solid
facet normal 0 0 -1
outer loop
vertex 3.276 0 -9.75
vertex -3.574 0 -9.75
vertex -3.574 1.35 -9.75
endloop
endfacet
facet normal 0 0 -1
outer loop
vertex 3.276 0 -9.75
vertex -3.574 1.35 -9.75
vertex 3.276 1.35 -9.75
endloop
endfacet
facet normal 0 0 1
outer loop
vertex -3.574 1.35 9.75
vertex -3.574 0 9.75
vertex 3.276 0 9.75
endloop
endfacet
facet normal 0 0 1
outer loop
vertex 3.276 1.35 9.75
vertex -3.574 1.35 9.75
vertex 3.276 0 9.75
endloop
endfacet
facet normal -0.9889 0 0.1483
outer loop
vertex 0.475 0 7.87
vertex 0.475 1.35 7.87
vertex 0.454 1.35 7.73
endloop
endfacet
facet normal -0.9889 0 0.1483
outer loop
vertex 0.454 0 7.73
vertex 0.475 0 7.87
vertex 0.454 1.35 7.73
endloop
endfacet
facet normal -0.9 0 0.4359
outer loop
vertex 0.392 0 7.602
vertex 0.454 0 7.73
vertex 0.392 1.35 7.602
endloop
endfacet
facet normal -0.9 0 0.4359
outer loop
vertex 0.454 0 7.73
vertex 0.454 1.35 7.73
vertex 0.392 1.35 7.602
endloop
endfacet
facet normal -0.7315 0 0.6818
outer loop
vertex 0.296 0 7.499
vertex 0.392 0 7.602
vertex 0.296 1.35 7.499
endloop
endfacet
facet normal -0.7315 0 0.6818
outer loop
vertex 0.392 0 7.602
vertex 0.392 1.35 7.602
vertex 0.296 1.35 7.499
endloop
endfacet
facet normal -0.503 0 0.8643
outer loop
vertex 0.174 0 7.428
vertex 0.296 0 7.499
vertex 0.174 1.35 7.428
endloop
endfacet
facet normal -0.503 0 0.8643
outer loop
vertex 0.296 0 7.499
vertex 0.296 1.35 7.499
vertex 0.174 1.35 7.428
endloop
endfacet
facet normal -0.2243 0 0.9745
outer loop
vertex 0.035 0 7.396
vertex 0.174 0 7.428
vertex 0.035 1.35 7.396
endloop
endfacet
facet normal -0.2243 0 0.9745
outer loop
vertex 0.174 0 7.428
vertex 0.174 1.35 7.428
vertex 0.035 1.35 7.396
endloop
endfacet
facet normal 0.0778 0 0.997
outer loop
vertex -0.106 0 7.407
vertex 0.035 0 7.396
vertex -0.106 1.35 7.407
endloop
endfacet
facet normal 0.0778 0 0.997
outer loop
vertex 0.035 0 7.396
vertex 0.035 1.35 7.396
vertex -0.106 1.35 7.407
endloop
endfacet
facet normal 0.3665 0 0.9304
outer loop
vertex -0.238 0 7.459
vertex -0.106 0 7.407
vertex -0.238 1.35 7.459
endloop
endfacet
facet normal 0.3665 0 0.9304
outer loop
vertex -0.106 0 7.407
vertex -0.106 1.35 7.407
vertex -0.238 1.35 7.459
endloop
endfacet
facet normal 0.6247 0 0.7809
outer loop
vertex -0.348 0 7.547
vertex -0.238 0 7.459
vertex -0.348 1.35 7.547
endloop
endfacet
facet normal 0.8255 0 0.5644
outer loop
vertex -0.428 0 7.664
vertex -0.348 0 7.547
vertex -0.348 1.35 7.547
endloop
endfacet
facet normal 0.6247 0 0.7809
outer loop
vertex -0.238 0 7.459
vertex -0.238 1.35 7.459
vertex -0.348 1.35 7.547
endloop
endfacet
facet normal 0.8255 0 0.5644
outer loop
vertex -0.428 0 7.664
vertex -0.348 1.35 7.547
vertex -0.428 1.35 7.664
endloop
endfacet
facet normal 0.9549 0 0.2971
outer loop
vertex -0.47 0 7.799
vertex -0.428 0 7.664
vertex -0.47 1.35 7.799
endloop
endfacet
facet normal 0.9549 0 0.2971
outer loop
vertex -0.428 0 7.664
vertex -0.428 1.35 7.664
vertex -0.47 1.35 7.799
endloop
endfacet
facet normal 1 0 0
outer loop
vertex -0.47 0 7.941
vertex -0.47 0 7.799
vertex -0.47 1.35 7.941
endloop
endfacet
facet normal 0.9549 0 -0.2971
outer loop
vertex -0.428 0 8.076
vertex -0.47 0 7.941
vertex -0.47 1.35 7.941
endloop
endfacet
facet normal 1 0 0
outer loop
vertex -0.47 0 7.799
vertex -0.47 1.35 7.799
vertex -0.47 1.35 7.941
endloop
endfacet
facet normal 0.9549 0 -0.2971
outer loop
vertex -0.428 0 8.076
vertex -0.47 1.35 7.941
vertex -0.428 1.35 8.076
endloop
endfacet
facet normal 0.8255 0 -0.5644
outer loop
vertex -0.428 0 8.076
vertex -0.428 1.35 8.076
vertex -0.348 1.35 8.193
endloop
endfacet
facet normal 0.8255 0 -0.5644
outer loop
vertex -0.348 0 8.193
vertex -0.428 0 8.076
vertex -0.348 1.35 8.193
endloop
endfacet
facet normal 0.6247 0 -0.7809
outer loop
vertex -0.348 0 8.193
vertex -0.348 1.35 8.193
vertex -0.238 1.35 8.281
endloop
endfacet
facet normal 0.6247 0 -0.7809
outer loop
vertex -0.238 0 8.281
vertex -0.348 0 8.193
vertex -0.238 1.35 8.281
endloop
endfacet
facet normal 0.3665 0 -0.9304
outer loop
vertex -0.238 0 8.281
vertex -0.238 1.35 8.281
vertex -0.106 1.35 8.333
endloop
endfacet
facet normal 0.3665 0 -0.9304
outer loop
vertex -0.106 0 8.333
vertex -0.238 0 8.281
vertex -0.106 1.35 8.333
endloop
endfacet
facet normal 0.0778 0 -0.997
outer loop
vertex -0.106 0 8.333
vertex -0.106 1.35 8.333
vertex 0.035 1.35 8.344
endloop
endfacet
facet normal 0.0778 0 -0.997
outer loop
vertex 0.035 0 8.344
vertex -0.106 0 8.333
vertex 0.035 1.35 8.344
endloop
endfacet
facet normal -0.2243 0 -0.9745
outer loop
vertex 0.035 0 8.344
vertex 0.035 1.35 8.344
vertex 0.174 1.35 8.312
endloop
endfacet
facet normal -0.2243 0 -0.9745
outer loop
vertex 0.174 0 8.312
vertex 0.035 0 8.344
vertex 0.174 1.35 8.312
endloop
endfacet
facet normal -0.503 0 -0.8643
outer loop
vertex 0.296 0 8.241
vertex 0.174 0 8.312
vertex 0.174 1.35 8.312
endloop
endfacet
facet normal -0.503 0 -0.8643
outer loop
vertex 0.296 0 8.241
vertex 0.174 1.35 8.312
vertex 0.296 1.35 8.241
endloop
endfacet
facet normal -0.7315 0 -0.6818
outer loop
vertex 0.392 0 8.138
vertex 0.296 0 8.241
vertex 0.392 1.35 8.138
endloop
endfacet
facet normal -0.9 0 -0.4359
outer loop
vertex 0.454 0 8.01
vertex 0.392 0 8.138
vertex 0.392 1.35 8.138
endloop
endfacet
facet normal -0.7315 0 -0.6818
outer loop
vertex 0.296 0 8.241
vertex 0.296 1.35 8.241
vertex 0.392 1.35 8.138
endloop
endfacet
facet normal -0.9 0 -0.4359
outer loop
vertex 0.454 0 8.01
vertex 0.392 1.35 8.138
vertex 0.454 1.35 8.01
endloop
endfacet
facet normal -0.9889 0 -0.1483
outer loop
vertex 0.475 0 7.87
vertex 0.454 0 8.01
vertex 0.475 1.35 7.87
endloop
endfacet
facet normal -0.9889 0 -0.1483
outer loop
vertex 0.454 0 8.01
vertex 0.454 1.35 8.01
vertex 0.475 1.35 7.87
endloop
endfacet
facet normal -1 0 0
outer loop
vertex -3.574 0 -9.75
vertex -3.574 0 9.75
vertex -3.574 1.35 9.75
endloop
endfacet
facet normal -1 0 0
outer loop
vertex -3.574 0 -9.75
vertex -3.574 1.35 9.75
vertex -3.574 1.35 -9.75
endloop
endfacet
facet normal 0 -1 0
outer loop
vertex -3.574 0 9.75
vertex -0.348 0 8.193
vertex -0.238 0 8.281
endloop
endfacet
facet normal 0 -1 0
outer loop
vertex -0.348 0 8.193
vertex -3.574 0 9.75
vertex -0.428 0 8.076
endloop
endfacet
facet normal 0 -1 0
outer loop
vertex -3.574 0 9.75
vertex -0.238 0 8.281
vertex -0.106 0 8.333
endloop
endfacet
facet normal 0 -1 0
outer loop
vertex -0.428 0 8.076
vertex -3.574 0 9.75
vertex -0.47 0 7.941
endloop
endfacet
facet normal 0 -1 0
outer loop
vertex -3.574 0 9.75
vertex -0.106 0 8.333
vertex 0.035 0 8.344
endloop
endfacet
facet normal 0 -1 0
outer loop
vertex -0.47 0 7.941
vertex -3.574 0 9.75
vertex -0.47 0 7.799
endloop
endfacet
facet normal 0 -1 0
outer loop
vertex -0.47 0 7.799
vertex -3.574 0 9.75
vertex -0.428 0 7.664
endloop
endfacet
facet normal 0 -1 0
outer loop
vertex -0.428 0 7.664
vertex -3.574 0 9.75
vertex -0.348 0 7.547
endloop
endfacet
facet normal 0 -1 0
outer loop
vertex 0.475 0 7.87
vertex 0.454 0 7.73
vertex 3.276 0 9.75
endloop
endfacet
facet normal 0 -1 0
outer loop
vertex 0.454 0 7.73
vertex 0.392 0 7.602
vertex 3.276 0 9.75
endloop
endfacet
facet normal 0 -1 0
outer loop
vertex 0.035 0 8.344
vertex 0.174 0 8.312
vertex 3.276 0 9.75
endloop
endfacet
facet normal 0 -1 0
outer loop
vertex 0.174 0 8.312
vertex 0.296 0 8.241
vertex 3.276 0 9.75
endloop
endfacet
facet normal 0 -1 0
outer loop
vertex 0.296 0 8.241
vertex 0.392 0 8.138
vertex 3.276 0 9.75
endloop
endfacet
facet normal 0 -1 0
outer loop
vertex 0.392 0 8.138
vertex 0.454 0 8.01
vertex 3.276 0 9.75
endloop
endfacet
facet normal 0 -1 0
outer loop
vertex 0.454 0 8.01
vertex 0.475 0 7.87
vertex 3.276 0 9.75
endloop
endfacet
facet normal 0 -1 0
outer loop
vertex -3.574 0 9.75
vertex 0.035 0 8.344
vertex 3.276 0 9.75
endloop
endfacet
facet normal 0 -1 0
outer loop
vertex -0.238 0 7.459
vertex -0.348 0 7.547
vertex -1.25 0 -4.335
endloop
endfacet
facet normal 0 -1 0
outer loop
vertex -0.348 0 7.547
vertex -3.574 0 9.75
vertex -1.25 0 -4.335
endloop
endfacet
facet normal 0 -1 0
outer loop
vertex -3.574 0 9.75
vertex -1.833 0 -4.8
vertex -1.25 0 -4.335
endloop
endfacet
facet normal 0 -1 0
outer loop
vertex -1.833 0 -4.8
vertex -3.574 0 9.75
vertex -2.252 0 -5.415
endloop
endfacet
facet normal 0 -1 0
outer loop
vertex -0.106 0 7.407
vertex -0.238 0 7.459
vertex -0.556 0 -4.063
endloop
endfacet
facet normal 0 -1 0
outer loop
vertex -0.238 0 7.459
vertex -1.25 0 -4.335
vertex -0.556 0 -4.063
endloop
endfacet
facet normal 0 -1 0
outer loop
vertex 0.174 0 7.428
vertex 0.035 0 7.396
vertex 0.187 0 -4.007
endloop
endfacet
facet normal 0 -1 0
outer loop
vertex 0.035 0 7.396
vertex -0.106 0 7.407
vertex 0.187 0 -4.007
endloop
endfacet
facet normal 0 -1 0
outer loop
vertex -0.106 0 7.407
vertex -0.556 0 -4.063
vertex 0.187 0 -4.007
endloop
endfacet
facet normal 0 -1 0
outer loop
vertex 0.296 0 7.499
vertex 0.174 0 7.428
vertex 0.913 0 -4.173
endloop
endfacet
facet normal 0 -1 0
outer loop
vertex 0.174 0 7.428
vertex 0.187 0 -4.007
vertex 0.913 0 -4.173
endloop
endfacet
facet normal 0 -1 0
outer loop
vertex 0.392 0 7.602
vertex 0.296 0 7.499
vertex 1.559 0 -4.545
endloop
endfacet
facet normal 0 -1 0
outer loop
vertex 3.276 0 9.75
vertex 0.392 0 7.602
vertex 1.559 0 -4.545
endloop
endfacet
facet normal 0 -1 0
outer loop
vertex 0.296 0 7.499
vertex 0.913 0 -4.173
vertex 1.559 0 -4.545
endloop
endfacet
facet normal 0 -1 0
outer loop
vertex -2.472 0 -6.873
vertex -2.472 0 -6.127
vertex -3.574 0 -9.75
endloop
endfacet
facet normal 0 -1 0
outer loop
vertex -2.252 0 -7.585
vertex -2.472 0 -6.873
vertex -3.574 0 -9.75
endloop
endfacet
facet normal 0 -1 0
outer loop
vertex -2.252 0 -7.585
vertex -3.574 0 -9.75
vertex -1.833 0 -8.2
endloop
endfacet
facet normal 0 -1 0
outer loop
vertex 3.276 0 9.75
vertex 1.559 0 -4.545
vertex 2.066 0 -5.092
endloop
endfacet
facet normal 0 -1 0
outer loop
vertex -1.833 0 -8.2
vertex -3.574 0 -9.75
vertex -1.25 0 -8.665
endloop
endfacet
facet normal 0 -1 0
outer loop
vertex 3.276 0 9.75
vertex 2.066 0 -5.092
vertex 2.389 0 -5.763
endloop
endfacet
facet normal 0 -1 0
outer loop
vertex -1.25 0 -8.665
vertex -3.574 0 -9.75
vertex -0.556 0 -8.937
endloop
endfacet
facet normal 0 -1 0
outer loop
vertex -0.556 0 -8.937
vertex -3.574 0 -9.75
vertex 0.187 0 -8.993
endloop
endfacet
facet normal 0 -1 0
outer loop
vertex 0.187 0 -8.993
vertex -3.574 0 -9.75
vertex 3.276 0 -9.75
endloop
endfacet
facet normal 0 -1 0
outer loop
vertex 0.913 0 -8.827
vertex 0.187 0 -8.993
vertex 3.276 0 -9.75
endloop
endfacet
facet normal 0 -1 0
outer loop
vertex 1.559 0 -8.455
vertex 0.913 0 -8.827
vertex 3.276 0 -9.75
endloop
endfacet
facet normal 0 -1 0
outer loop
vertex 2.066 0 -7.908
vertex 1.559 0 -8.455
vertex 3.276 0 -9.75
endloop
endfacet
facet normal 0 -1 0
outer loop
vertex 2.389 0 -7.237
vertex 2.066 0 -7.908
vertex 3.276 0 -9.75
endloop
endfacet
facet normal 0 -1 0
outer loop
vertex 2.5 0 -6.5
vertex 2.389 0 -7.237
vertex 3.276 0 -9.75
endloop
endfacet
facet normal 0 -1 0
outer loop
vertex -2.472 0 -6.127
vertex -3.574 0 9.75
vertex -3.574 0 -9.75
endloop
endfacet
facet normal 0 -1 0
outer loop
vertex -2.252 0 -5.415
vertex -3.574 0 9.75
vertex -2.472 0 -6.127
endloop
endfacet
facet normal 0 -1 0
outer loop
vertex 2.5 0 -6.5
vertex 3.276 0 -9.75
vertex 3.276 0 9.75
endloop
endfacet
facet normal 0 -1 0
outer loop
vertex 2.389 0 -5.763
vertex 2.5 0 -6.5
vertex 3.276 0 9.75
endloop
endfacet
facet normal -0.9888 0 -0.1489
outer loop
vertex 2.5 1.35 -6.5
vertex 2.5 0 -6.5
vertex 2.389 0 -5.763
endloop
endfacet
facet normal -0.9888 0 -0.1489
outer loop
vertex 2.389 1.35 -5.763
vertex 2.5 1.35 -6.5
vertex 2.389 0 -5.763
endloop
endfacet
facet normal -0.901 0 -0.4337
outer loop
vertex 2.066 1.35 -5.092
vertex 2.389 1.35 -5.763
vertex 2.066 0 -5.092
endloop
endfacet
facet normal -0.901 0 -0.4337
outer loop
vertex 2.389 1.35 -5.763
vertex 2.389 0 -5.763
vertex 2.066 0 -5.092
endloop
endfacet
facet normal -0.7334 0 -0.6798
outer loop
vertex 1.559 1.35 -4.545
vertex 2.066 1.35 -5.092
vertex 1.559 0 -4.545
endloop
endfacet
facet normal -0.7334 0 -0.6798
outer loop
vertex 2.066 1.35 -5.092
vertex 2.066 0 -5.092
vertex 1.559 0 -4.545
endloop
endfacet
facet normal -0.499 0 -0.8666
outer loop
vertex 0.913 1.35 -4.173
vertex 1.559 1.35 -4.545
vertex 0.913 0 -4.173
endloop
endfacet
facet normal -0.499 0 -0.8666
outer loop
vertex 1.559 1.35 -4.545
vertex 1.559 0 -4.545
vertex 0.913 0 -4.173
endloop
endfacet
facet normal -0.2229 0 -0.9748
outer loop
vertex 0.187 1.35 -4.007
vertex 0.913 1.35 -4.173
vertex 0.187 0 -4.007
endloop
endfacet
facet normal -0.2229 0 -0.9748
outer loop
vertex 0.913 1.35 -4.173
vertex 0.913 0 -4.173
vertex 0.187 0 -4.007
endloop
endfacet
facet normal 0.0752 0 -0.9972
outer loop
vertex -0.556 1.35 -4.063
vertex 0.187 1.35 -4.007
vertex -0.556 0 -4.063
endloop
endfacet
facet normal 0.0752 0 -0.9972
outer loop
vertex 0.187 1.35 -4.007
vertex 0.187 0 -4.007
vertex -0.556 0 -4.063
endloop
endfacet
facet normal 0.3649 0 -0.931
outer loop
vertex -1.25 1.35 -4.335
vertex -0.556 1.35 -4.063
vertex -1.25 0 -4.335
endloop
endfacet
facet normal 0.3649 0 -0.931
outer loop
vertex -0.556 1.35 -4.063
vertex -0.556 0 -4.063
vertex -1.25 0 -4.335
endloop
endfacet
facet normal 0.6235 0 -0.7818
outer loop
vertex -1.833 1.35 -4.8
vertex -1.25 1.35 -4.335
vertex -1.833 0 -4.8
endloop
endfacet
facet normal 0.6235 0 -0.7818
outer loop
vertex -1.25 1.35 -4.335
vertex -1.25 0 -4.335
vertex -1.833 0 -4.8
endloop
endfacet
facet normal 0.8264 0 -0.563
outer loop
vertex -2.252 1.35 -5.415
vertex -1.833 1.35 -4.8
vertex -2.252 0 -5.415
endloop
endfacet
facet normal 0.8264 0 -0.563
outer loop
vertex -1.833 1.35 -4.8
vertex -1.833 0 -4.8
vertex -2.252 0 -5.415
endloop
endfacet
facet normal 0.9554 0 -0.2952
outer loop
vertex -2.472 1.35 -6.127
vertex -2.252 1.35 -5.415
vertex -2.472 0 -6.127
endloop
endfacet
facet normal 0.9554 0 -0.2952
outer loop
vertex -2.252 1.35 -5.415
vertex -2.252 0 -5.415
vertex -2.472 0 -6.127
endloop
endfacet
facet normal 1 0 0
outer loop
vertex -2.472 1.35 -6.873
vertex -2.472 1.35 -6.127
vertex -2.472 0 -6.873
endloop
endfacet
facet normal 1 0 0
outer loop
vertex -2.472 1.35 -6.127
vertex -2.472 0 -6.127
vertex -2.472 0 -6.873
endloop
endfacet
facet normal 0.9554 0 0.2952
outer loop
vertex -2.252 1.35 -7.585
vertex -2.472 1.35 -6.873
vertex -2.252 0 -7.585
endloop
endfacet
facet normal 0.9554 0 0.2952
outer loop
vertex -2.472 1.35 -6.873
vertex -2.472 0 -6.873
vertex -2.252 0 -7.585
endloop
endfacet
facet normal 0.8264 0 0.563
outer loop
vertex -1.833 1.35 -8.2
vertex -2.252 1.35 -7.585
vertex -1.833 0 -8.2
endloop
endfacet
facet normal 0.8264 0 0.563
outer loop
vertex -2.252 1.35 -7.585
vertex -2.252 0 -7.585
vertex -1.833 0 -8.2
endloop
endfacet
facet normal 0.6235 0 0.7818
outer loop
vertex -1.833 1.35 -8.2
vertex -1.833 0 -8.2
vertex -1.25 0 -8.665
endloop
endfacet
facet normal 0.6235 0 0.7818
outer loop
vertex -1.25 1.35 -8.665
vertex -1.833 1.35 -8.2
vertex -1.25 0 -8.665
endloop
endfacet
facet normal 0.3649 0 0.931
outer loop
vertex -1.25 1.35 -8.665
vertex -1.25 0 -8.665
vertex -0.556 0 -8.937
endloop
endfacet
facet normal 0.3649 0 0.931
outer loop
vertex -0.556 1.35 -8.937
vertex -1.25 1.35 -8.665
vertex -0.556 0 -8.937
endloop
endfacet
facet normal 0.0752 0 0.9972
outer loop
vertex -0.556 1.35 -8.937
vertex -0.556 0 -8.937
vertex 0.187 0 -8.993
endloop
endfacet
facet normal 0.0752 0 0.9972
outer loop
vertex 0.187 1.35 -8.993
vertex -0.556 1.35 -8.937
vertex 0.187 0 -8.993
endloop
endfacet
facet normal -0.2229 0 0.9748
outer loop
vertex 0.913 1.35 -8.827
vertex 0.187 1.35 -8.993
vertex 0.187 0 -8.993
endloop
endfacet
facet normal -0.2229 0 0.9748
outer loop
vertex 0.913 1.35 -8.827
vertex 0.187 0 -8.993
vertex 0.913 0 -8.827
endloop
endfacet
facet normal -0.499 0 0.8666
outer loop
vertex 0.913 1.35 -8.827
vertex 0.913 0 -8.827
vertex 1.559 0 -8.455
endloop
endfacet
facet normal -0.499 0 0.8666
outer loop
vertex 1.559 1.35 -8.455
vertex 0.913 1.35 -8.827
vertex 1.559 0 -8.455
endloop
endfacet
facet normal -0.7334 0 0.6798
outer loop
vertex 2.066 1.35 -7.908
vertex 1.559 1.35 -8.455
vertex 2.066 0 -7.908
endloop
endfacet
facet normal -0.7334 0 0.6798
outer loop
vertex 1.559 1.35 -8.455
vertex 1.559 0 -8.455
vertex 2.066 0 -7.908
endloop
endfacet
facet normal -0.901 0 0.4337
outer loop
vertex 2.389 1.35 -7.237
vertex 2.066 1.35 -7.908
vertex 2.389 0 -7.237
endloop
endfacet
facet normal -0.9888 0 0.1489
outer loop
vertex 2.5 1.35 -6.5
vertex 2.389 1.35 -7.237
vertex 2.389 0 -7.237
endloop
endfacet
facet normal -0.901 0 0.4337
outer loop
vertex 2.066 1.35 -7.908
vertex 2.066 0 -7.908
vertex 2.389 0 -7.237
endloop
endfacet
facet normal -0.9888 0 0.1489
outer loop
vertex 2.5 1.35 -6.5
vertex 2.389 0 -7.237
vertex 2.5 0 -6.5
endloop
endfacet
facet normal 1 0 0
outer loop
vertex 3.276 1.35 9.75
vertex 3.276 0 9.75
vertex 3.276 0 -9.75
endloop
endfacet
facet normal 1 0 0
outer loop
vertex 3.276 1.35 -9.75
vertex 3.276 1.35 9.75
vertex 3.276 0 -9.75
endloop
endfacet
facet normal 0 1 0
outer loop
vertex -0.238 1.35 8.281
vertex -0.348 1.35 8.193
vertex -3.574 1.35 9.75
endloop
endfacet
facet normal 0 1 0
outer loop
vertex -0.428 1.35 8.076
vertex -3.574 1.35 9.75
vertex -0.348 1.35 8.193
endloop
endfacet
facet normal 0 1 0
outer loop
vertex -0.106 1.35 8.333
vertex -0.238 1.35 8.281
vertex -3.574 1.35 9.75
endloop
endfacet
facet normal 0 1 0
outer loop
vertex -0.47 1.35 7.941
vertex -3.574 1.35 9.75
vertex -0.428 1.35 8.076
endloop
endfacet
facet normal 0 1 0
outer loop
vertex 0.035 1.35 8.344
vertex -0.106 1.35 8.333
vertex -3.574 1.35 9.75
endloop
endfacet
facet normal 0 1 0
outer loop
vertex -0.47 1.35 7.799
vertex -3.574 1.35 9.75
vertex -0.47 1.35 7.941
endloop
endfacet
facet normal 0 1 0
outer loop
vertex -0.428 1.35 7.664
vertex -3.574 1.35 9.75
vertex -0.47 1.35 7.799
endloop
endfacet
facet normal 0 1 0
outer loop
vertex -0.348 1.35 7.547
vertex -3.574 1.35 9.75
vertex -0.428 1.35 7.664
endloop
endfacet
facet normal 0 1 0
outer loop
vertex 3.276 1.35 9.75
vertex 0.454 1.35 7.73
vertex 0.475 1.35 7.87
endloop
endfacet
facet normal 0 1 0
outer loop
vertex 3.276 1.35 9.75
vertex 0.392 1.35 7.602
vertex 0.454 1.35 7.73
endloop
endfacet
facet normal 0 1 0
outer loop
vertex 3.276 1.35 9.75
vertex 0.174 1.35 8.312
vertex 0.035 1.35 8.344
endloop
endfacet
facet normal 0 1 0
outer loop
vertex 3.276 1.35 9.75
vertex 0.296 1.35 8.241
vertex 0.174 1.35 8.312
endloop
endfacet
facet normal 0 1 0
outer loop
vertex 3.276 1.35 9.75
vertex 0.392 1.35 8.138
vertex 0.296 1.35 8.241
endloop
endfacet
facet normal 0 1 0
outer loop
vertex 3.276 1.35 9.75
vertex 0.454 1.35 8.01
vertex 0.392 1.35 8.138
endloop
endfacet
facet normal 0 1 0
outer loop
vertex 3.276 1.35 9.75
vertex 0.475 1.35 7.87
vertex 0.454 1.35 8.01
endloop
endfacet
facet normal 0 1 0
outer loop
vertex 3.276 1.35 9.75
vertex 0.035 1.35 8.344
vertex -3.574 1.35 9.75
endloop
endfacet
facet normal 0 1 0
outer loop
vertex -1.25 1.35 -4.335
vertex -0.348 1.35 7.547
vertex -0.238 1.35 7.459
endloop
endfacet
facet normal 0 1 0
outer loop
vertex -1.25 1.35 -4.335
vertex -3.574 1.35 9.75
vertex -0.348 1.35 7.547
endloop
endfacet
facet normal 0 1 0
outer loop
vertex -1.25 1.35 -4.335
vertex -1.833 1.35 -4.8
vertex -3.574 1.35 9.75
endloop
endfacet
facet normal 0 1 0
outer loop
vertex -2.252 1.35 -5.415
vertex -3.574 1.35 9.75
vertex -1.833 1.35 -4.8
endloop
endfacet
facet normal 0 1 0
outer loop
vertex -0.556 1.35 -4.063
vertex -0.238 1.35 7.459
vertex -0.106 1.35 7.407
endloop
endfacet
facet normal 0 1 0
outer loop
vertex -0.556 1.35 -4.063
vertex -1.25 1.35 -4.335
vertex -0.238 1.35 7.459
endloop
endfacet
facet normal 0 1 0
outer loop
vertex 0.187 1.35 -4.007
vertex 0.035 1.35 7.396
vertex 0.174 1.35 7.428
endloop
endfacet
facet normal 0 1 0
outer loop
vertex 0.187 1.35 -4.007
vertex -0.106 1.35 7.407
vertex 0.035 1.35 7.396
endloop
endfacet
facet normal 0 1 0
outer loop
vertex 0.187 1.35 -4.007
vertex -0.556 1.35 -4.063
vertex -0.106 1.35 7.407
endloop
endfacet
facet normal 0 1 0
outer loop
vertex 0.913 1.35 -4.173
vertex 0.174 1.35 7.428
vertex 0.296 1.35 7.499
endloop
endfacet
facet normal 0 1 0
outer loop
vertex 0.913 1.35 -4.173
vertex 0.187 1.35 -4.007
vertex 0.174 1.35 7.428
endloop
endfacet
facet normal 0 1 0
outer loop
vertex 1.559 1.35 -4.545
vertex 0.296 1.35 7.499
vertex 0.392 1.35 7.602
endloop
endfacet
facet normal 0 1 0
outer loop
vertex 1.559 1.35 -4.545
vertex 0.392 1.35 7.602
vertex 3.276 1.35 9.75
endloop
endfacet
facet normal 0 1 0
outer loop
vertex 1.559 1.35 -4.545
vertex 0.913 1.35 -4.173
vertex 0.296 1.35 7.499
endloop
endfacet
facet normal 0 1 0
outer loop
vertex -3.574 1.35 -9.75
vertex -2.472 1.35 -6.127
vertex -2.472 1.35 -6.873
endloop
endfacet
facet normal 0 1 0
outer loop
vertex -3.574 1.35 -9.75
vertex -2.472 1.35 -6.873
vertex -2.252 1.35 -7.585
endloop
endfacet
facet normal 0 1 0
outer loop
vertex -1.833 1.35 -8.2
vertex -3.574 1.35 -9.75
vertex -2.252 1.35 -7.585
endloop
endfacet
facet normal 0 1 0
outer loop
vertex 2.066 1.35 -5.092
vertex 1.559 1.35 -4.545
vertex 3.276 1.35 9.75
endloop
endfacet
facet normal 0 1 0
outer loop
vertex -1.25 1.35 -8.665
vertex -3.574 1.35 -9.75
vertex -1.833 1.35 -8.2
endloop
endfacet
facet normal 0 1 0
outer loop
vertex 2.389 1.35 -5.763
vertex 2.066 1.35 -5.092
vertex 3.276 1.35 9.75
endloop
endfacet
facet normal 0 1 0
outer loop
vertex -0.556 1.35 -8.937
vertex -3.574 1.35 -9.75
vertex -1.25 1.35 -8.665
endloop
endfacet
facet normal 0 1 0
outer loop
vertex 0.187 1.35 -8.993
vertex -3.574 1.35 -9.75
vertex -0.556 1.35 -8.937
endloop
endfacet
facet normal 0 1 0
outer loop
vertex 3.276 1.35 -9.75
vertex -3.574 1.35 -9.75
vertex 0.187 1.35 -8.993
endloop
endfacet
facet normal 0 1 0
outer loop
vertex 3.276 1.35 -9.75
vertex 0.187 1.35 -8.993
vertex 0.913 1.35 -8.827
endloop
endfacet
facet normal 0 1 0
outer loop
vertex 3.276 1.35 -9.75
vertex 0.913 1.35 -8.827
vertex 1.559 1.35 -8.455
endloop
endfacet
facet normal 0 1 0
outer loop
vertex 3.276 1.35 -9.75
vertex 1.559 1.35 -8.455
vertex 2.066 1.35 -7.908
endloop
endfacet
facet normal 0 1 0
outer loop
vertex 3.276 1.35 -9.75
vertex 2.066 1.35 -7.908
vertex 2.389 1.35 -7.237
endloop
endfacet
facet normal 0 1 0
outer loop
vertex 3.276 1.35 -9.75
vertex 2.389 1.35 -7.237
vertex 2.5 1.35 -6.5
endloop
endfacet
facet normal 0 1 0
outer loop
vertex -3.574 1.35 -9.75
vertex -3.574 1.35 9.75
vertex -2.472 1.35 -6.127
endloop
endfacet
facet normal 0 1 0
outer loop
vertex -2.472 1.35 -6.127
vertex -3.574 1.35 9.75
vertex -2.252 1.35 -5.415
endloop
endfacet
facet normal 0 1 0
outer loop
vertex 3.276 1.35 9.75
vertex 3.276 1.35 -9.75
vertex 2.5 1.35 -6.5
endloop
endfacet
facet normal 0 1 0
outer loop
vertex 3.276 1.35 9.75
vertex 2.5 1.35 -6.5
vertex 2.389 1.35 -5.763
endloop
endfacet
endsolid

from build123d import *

# Parameters (mm, degrees)
SKETCH1_W           = 6.85
SKETCH1_H           = 19.5
BOSS_EXTRUDE2_DEPTH = 1.35
SKETCH2_R           = 2.5
CUT_EXTRUDE1_DEPTH  = 1.35
SKETCH3_R           = 0.475
CUT_EXTRUDE2_DEPTH  = 1.35


with BuildPart() as part:
    # Sketch1 → Boss-Extrude2 (new body)
    with BuildSketch(Plane(origin=(0, 0, 0), x_dir=(1, 0, 0), z_dir=(0, 1, 0))):
        with Locations((-0.149, 0)):
            Rectangle(SKETCH1_W, SKETCH1_H)
    extrude(amount=BOSS_EXTRUDE2_DEPTH)

    # Sketch2 → Cut-Extrude1 (cut)
    with BuildSketch(Plane.XZ):
        with Locations((0, -6.5)):
            Circle(SKETCH2_R)
    extrude(amount=-CUT_EXTRUDE1_DEPTH, mode=Mode.SUBTRACT)

    # Sketch3 → Cut-Extrude2 (cut)
    with BuildSketch(Plane(origin=(0, 1.35, 0), x_dir=(1, 0, 0), z_dir=(0, 1, 0))):
        with Locations((0, -7.87)):
            Circle(SKETCH3_R)
    extrude(amount=-CUT_EXTRUDE2_DEPTH, mode=Mode.SUBTRACT)


solid = part.part
